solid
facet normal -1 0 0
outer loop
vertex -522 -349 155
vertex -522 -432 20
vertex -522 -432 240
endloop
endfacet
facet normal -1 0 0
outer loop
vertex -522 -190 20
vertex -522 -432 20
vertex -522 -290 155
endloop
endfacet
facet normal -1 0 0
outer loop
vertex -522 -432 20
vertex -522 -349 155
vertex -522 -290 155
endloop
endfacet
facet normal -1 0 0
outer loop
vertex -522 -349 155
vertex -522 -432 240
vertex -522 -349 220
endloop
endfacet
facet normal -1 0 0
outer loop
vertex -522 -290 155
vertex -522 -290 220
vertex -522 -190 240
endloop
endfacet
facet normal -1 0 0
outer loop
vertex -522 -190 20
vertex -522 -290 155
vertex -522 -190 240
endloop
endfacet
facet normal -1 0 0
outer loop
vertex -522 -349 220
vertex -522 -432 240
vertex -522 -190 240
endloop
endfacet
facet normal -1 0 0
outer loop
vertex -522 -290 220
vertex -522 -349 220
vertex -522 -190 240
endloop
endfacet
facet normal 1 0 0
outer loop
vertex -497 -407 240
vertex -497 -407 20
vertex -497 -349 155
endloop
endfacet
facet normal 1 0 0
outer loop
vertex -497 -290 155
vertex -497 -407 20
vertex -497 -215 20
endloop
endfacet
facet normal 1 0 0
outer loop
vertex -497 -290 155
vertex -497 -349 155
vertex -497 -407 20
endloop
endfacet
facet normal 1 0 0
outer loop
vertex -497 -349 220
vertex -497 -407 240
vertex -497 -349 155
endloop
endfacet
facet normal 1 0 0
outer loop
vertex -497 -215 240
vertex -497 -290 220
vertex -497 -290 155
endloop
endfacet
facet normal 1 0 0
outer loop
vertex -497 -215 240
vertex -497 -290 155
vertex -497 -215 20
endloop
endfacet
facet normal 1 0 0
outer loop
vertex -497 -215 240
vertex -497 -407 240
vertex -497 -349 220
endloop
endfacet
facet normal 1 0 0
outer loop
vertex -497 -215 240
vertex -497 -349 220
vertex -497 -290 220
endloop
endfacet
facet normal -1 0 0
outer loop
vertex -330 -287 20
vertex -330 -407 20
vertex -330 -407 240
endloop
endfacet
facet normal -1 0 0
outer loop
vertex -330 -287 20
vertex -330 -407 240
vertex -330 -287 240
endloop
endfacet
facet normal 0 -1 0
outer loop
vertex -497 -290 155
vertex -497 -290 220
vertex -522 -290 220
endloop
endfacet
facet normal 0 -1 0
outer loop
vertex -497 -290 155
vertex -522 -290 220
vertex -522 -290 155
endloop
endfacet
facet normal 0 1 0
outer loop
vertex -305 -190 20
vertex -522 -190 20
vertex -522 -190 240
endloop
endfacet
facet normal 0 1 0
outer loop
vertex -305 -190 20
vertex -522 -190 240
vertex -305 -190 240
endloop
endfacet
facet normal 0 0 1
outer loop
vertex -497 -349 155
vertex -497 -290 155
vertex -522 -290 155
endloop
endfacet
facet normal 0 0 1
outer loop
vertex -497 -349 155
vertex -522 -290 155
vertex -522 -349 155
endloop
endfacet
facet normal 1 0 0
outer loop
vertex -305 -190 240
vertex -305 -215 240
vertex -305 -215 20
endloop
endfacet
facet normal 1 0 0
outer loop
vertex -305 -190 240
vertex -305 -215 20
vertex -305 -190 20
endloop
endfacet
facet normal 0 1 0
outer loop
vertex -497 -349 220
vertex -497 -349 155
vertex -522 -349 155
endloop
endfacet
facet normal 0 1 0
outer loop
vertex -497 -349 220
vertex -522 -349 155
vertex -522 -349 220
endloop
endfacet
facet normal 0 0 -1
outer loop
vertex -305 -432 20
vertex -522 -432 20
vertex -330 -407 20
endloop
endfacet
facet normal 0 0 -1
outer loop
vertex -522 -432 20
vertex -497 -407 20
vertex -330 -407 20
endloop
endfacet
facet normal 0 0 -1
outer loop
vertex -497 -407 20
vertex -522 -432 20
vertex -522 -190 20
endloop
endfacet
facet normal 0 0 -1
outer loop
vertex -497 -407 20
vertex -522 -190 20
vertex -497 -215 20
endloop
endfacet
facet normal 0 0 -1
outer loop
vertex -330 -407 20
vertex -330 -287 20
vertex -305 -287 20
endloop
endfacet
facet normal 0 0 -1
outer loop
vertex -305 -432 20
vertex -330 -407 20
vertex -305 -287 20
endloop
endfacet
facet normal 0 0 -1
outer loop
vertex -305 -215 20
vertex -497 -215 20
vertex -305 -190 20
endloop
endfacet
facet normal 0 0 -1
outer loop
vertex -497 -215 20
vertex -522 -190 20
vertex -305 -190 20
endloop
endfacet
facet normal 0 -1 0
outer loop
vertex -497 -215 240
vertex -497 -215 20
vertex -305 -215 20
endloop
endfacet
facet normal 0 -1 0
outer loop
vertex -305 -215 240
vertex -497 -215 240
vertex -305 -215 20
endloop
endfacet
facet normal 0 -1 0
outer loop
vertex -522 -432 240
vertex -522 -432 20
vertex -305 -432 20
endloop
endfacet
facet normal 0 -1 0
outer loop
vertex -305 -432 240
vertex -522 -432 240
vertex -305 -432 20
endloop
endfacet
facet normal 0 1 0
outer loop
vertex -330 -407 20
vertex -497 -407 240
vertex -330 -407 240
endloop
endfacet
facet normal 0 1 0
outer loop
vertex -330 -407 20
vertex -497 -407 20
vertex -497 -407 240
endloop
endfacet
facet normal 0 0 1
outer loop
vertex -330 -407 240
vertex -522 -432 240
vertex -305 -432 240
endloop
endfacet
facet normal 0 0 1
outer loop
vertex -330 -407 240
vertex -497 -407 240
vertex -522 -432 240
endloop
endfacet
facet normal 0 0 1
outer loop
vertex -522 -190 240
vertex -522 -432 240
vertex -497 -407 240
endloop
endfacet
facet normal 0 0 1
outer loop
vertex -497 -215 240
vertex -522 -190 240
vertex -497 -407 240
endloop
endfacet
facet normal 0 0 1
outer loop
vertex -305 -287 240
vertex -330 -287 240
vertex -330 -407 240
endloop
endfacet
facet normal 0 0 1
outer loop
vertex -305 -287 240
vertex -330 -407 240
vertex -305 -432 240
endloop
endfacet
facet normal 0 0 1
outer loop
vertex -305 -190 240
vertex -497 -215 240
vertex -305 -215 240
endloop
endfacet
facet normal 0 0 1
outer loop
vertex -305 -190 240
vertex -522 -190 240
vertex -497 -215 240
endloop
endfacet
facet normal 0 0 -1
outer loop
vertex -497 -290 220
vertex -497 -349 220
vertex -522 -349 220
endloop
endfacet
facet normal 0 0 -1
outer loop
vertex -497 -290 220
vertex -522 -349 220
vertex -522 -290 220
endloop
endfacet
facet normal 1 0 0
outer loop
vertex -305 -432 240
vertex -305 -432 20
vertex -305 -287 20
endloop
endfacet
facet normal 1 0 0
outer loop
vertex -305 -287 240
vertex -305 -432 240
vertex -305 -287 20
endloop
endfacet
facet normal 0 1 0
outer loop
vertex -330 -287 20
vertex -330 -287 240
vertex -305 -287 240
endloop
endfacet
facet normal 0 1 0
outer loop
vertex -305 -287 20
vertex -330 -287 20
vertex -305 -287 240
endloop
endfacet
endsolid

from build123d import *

# Parameters (mm, degrees)
F2_DEPTH  = 20
F3_W      = 217
F3_H      = 242
F3_W_2    = 167
F3_H_2    = 192
F4_DEPTH  = 240
F5_W      = 48
F5_H      = 72
F6_DEPTH  = 250
F7_W      = 79
F7_H      = 85
F8_DEPTH  = 25
F10_DEPTH = 25
F11_DEPTH = 25
F12_DEPTH = 20


with BuildPart() as f2:
    # F1 (on face) → F2 (new body)
    with BuildSketch(Plane.XY):
        Polygon((-497, -215), (-497, -231), (-497, -293), (-497, -407), (-330, -407), (-330, -287), (-330, -215), align=None)
    extrude(amount=F2_DEPTH)

    # F3 (on face) → F4 (join)
    with BuildSketch(Plane.XY):
        with Locations((-413.5, -311)):
            Rectangle(F3_W, F3_H)
        with Locations((-413.5, -311)):
            Rectangle(F3_W_2, F3_H_2, mode=Mode.SUBTRACT)
    extrude(amount=F4_DEPTH)

    # F5 (on face) → F6 (cut)
    with BuildSketch(Plane.XY.offset(20)):
        with Locations((-306, -251)):
            Rectangle(F5_W, F5_H)
    extrude(amount=F6_DEPTH, mode=Mode.SUBTRACT)

    # F7 (on face) → F8 (cut)
    with BuildSketch(Plane.YZ.offset(-497)):
        with Locations((-309.5, 177.5)):
            Rectangle(F7_W, F7_H)
    extrude(amount=-F8_DEPTH, mode=Mode.SUBTRACT)

    # F9 (on face) → F10 (join, through all)
    with BuildSketch(Plane.YZ.offset(-497)):
        Polygon((-270, 135), (-270, 220), (-290, 220), (-290, 155), (-349, 155), (-349, 135), align=None)
    extrude(amount=-F10_DEPTH)

    # F11 (cut): a face of the model
    f11_faces = [f2.faces().sort_by_distance(p)[0] for p in [
        (-408.3972360028, -307.8107725018, 20),
    ]]
    extrude(f11_faces, amount=-F11_DEPTH, mode=Mode.SUBTRACT)

    # F12 (cut): a face of the model
    f12_faces = [f2.faces().sort_by_distance(p)[0] for p in [
        (-308.2504307407, -202.5, 0),
    ]]
    extrude(f12_faces, amount=-F12_DEPTH, mode=Mode.SUBTRACT)


solid = f2.part
